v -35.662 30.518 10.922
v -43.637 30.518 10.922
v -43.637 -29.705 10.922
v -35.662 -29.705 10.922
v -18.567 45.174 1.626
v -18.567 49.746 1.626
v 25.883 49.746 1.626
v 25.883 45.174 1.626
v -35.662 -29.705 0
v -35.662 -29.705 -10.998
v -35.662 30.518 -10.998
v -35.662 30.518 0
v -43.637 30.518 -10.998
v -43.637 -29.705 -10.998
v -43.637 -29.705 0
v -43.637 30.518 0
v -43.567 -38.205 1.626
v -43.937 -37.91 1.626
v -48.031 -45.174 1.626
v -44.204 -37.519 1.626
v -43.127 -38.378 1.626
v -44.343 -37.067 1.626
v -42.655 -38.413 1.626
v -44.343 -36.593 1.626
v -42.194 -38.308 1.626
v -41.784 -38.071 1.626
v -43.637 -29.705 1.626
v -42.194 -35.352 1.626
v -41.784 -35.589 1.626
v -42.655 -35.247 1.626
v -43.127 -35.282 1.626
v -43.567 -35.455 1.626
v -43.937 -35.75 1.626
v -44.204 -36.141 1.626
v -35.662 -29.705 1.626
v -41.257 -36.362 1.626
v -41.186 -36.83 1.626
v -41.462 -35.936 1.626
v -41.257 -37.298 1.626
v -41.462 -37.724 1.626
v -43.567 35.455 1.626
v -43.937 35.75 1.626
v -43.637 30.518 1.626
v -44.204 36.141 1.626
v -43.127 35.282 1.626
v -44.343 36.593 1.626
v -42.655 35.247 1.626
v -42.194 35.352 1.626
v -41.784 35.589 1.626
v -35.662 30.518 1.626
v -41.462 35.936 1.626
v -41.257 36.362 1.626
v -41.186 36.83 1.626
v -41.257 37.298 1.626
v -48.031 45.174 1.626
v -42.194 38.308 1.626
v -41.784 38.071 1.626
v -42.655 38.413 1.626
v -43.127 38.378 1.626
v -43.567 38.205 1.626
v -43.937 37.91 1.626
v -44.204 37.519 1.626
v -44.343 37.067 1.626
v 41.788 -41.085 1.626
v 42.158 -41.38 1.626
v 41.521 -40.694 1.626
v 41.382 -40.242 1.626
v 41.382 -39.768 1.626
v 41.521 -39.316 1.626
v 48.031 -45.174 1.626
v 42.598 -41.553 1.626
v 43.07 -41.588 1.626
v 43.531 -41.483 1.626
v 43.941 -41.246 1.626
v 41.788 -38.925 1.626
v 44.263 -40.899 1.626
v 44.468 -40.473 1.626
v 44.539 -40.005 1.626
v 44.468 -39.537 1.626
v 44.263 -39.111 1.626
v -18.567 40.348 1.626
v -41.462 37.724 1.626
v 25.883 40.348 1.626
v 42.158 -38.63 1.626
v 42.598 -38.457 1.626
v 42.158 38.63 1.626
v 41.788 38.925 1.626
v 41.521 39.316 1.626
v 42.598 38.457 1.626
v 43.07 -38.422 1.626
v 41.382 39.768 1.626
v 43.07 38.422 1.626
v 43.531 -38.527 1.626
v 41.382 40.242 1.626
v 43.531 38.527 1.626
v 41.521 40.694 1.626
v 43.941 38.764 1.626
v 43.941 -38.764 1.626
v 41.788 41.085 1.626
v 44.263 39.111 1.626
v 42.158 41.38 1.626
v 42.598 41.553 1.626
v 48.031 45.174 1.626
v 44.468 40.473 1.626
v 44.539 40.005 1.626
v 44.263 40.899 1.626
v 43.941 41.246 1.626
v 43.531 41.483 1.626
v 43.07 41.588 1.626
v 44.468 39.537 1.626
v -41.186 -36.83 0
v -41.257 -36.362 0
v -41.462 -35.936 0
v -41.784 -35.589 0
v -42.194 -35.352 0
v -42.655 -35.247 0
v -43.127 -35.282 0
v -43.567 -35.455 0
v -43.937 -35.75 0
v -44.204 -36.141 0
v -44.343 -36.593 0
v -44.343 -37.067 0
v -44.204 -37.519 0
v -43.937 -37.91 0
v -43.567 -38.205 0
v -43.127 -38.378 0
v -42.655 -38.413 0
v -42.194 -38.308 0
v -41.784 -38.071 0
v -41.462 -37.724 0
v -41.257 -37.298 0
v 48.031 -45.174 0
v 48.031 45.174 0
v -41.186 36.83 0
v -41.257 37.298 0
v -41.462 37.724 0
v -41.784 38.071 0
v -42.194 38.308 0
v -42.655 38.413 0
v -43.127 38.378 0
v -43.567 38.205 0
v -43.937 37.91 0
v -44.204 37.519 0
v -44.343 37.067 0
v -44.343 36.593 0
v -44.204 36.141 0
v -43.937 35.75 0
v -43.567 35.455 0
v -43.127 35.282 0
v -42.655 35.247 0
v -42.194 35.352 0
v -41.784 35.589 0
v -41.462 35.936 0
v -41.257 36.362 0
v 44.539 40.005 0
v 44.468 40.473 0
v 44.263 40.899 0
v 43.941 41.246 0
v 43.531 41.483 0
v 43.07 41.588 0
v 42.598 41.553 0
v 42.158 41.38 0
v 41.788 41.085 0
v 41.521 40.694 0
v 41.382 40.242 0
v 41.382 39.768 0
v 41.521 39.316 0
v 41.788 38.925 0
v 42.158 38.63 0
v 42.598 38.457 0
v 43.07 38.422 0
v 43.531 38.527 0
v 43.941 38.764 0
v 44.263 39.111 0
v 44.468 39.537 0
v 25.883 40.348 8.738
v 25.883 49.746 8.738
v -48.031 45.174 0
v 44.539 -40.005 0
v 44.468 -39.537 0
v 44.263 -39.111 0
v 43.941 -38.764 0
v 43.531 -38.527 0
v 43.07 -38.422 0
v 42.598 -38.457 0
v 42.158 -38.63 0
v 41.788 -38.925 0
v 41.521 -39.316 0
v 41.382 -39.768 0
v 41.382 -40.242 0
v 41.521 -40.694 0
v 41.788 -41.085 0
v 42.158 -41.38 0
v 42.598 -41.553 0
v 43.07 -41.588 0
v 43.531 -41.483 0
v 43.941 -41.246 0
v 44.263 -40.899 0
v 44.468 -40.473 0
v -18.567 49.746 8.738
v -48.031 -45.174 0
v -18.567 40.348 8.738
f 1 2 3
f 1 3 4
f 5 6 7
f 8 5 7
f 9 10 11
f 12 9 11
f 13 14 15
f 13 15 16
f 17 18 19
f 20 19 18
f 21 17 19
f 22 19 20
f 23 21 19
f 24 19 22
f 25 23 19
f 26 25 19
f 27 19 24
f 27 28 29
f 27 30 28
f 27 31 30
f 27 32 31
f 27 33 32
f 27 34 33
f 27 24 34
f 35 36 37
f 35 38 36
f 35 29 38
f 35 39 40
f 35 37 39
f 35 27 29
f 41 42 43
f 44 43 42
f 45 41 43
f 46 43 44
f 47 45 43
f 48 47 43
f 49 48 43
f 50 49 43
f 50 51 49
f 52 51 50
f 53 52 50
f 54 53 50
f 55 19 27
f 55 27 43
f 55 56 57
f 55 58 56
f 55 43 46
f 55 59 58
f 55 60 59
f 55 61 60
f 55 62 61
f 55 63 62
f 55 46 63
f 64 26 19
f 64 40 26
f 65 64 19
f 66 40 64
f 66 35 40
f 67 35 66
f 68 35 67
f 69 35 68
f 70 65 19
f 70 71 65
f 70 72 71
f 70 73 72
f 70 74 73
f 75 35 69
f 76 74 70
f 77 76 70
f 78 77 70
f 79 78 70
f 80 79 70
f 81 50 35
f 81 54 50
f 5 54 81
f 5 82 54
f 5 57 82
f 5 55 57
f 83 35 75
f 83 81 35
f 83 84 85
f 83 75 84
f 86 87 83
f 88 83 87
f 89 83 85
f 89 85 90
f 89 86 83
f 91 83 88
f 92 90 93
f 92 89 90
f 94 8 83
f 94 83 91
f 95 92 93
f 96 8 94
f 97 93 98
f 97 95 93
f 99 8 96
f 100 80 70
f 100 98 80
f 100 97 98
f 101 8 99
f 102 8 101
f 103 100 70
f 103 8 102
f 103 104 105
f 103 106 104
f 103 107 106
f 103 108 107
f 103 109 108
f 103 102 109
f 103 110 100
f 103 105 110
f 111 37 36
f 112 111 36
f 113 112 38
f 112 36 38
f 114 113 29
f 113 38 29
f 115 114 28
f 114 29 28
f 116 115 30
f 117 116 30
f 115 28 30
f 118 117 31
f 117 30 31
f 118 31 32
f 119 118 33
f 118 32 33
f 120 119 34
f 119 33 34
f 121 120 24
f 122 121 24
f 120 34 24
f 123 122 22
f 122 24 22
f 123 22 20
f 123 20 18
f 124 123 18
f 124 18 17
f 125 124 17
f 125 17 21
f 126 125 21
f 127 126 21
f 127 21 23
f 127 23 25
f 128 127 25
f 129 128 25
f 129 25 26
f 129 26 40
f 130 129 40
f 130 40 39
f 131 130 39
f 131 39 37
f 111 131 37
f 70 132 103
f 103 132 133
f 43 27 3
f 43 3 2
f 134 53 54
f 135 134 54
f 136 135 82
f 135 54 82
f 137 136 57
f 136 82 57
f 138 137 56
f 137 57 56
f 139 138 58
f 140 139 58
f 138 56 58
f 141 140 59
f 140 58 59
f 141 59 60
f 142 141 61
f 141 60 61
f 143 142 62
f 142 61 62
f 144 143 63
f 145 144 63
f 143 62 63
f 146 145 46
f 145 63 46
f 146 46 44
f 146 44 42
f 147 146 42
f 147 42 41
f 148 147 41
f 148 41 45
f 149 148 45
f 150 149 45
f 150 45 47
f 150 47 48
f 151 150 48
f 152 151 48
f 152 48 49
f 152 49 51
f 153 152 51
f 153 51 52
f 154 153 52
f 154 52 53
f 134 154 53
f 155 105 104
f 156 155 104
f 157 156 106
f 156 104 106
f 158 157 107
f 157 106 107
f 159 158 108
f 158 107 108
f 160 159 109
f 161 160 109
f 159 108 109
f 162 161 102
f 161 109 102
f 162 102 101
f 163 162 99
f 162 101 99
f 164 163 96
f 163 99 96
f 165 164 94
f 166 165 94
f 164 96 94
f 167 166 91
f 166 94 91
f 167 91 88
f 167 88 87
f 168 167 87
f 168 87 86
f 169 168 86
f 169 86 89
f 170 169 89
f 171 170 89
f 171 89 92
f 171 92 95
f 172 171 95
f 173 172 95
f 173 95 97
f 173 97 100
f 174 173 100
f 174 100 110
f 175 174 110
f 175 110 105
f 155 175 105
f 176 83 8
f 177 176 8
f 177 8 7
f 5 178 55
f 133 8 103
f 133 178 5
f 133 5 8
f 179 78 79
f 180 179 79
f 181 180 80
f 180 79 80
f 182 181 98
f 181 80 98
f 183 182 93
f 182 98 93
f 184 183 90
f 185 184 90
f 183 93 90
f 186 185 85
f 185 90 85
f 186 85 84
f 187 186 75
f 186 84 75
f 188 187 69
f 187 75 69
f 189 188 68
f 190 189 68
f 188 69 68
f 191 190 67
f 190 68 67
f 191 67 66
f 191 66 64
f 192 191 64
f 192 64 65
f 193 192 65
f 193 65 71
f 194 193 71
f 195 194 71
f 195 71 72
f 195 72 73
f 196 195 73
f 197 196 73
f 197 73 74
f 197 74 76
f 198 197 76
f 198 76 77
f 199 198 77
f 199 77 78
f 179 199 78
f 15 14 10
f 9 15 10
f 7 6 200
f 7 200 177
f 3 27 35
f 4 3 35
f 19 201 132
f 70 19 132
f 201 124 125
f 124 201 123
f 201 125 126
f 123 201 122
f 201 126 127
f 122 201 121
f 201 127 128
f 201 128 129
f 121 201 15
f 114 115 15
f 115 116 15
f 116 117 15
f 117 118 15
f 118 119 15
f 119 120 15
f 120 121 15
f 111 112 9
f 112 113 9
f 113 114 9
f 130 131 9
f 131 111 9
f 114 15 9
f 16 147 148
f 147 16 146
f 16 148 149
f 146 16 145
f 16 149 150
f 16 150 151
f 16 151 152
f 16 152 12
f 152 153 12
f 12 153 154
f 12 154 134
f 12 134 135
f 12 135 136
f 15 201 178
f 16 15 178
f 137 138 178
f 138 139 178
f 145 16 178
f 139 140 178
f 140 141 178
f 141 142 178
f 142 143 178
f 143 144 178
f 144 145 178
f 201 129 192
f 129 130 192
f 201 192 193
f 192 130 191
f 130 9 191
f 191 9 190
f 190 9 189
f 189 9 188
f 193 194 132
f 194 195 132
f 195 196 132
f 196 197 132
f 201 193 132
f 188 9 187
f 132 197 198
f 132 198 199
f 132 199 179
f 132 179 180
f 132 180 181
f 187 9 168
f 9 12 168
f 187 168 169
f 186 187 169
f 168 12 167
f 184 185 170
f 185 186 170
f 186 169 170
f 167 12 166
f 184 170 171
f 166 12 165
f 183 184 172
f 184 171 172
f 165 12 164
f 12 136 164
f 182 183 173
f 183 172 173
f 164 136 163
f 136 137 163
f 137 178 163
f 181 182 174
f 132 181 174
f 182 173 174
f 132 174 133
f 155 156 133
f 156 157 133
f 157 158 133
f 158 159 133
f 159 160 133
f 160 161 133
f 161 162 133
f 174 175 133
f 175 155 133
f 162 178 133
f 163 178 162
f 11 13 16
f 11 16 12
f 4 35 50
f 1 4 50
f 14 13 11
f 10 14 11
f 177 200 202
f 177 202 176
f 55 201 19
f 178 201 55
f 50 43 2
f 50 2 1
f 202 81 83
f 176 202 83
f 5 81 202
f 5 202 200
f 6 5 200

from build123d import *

# Parameters (mm, degrees)
SKETCH1_W                    = 96.0628
SKETCH1_H                    = 90.3478
PCB_DEPTH                    = 1.6256
SKETCH5_R                    = 1.5875
PCB_HOLES_DEPTH              = 66.957101229
PCI_104_CONNECTOR_DEPTH      = 9.2964
PCI_104_CONNECTOR_DEPTH_BACK = 12.6238
SKETCH2_W                    = 7.9756
SKETCH2_H                    = 60.2234
SKETCH6_W                    = 44.45
SKETCH6_H                    = 9.398
PCB_EDGE_CONNS_DEPTH         = 7.112


with BuildPart() as part:
    # Sketch1 → PCB (new body)
    with BuildSketch(Plane.XY):
        Rectangle(SKETCH1_W, SKETCH1_H)
    extrude(amount=PCB_DEPTH)

    # Sketch5 → PCB_Holes (cut, through all)
    with BuildSketch(Plane.XY.offset(1.6256)):
        with Locations((-42.7736, 36.83)):
            Circle(SKETCH5_R)
        with Locations((42.9514, 40.005)):
            Circle(SKETCH5_R)
        with Locations((42.9514, -40.005)):
            Circle(SKETCH5_R)
        with Locations((-42.7736, -36.83)):
            Circle(SKETCH5_R)
    extrude(amount=-PCB_HOLES_DEPTH, mode=Mode.SUBTRACT)

    # Sketch2 → PCI-104_Connector (add, two sides: drawn at the far end of the back side and taken through both)
    with BuildSketch(Plane.XY.offset(1.6256).offset(-PCI_104_CONNECTOR_DEPTH_BACK)):
        with Locations((-39.6494, 0.4064)):
            Rectangle(SKETCH2_W, SKETCH2_H)
    extrude(amount=PCI_104_CONNECTOR_DEPTH + PCI_104_CONNECTOR_DEPTH_BACK)

    # Sketch6 → PCB_Edge_Conns (add)
    with BuildSketch(Plane.XY.offset(1.6256)):
        with Locations((3.6576, 45.0469)):
            Rectangle(SKETCH6_W, SKETCH6_H)
    extrude(amount=PCB_EDGE_CONNS_DEPTH)


solid = part.part
